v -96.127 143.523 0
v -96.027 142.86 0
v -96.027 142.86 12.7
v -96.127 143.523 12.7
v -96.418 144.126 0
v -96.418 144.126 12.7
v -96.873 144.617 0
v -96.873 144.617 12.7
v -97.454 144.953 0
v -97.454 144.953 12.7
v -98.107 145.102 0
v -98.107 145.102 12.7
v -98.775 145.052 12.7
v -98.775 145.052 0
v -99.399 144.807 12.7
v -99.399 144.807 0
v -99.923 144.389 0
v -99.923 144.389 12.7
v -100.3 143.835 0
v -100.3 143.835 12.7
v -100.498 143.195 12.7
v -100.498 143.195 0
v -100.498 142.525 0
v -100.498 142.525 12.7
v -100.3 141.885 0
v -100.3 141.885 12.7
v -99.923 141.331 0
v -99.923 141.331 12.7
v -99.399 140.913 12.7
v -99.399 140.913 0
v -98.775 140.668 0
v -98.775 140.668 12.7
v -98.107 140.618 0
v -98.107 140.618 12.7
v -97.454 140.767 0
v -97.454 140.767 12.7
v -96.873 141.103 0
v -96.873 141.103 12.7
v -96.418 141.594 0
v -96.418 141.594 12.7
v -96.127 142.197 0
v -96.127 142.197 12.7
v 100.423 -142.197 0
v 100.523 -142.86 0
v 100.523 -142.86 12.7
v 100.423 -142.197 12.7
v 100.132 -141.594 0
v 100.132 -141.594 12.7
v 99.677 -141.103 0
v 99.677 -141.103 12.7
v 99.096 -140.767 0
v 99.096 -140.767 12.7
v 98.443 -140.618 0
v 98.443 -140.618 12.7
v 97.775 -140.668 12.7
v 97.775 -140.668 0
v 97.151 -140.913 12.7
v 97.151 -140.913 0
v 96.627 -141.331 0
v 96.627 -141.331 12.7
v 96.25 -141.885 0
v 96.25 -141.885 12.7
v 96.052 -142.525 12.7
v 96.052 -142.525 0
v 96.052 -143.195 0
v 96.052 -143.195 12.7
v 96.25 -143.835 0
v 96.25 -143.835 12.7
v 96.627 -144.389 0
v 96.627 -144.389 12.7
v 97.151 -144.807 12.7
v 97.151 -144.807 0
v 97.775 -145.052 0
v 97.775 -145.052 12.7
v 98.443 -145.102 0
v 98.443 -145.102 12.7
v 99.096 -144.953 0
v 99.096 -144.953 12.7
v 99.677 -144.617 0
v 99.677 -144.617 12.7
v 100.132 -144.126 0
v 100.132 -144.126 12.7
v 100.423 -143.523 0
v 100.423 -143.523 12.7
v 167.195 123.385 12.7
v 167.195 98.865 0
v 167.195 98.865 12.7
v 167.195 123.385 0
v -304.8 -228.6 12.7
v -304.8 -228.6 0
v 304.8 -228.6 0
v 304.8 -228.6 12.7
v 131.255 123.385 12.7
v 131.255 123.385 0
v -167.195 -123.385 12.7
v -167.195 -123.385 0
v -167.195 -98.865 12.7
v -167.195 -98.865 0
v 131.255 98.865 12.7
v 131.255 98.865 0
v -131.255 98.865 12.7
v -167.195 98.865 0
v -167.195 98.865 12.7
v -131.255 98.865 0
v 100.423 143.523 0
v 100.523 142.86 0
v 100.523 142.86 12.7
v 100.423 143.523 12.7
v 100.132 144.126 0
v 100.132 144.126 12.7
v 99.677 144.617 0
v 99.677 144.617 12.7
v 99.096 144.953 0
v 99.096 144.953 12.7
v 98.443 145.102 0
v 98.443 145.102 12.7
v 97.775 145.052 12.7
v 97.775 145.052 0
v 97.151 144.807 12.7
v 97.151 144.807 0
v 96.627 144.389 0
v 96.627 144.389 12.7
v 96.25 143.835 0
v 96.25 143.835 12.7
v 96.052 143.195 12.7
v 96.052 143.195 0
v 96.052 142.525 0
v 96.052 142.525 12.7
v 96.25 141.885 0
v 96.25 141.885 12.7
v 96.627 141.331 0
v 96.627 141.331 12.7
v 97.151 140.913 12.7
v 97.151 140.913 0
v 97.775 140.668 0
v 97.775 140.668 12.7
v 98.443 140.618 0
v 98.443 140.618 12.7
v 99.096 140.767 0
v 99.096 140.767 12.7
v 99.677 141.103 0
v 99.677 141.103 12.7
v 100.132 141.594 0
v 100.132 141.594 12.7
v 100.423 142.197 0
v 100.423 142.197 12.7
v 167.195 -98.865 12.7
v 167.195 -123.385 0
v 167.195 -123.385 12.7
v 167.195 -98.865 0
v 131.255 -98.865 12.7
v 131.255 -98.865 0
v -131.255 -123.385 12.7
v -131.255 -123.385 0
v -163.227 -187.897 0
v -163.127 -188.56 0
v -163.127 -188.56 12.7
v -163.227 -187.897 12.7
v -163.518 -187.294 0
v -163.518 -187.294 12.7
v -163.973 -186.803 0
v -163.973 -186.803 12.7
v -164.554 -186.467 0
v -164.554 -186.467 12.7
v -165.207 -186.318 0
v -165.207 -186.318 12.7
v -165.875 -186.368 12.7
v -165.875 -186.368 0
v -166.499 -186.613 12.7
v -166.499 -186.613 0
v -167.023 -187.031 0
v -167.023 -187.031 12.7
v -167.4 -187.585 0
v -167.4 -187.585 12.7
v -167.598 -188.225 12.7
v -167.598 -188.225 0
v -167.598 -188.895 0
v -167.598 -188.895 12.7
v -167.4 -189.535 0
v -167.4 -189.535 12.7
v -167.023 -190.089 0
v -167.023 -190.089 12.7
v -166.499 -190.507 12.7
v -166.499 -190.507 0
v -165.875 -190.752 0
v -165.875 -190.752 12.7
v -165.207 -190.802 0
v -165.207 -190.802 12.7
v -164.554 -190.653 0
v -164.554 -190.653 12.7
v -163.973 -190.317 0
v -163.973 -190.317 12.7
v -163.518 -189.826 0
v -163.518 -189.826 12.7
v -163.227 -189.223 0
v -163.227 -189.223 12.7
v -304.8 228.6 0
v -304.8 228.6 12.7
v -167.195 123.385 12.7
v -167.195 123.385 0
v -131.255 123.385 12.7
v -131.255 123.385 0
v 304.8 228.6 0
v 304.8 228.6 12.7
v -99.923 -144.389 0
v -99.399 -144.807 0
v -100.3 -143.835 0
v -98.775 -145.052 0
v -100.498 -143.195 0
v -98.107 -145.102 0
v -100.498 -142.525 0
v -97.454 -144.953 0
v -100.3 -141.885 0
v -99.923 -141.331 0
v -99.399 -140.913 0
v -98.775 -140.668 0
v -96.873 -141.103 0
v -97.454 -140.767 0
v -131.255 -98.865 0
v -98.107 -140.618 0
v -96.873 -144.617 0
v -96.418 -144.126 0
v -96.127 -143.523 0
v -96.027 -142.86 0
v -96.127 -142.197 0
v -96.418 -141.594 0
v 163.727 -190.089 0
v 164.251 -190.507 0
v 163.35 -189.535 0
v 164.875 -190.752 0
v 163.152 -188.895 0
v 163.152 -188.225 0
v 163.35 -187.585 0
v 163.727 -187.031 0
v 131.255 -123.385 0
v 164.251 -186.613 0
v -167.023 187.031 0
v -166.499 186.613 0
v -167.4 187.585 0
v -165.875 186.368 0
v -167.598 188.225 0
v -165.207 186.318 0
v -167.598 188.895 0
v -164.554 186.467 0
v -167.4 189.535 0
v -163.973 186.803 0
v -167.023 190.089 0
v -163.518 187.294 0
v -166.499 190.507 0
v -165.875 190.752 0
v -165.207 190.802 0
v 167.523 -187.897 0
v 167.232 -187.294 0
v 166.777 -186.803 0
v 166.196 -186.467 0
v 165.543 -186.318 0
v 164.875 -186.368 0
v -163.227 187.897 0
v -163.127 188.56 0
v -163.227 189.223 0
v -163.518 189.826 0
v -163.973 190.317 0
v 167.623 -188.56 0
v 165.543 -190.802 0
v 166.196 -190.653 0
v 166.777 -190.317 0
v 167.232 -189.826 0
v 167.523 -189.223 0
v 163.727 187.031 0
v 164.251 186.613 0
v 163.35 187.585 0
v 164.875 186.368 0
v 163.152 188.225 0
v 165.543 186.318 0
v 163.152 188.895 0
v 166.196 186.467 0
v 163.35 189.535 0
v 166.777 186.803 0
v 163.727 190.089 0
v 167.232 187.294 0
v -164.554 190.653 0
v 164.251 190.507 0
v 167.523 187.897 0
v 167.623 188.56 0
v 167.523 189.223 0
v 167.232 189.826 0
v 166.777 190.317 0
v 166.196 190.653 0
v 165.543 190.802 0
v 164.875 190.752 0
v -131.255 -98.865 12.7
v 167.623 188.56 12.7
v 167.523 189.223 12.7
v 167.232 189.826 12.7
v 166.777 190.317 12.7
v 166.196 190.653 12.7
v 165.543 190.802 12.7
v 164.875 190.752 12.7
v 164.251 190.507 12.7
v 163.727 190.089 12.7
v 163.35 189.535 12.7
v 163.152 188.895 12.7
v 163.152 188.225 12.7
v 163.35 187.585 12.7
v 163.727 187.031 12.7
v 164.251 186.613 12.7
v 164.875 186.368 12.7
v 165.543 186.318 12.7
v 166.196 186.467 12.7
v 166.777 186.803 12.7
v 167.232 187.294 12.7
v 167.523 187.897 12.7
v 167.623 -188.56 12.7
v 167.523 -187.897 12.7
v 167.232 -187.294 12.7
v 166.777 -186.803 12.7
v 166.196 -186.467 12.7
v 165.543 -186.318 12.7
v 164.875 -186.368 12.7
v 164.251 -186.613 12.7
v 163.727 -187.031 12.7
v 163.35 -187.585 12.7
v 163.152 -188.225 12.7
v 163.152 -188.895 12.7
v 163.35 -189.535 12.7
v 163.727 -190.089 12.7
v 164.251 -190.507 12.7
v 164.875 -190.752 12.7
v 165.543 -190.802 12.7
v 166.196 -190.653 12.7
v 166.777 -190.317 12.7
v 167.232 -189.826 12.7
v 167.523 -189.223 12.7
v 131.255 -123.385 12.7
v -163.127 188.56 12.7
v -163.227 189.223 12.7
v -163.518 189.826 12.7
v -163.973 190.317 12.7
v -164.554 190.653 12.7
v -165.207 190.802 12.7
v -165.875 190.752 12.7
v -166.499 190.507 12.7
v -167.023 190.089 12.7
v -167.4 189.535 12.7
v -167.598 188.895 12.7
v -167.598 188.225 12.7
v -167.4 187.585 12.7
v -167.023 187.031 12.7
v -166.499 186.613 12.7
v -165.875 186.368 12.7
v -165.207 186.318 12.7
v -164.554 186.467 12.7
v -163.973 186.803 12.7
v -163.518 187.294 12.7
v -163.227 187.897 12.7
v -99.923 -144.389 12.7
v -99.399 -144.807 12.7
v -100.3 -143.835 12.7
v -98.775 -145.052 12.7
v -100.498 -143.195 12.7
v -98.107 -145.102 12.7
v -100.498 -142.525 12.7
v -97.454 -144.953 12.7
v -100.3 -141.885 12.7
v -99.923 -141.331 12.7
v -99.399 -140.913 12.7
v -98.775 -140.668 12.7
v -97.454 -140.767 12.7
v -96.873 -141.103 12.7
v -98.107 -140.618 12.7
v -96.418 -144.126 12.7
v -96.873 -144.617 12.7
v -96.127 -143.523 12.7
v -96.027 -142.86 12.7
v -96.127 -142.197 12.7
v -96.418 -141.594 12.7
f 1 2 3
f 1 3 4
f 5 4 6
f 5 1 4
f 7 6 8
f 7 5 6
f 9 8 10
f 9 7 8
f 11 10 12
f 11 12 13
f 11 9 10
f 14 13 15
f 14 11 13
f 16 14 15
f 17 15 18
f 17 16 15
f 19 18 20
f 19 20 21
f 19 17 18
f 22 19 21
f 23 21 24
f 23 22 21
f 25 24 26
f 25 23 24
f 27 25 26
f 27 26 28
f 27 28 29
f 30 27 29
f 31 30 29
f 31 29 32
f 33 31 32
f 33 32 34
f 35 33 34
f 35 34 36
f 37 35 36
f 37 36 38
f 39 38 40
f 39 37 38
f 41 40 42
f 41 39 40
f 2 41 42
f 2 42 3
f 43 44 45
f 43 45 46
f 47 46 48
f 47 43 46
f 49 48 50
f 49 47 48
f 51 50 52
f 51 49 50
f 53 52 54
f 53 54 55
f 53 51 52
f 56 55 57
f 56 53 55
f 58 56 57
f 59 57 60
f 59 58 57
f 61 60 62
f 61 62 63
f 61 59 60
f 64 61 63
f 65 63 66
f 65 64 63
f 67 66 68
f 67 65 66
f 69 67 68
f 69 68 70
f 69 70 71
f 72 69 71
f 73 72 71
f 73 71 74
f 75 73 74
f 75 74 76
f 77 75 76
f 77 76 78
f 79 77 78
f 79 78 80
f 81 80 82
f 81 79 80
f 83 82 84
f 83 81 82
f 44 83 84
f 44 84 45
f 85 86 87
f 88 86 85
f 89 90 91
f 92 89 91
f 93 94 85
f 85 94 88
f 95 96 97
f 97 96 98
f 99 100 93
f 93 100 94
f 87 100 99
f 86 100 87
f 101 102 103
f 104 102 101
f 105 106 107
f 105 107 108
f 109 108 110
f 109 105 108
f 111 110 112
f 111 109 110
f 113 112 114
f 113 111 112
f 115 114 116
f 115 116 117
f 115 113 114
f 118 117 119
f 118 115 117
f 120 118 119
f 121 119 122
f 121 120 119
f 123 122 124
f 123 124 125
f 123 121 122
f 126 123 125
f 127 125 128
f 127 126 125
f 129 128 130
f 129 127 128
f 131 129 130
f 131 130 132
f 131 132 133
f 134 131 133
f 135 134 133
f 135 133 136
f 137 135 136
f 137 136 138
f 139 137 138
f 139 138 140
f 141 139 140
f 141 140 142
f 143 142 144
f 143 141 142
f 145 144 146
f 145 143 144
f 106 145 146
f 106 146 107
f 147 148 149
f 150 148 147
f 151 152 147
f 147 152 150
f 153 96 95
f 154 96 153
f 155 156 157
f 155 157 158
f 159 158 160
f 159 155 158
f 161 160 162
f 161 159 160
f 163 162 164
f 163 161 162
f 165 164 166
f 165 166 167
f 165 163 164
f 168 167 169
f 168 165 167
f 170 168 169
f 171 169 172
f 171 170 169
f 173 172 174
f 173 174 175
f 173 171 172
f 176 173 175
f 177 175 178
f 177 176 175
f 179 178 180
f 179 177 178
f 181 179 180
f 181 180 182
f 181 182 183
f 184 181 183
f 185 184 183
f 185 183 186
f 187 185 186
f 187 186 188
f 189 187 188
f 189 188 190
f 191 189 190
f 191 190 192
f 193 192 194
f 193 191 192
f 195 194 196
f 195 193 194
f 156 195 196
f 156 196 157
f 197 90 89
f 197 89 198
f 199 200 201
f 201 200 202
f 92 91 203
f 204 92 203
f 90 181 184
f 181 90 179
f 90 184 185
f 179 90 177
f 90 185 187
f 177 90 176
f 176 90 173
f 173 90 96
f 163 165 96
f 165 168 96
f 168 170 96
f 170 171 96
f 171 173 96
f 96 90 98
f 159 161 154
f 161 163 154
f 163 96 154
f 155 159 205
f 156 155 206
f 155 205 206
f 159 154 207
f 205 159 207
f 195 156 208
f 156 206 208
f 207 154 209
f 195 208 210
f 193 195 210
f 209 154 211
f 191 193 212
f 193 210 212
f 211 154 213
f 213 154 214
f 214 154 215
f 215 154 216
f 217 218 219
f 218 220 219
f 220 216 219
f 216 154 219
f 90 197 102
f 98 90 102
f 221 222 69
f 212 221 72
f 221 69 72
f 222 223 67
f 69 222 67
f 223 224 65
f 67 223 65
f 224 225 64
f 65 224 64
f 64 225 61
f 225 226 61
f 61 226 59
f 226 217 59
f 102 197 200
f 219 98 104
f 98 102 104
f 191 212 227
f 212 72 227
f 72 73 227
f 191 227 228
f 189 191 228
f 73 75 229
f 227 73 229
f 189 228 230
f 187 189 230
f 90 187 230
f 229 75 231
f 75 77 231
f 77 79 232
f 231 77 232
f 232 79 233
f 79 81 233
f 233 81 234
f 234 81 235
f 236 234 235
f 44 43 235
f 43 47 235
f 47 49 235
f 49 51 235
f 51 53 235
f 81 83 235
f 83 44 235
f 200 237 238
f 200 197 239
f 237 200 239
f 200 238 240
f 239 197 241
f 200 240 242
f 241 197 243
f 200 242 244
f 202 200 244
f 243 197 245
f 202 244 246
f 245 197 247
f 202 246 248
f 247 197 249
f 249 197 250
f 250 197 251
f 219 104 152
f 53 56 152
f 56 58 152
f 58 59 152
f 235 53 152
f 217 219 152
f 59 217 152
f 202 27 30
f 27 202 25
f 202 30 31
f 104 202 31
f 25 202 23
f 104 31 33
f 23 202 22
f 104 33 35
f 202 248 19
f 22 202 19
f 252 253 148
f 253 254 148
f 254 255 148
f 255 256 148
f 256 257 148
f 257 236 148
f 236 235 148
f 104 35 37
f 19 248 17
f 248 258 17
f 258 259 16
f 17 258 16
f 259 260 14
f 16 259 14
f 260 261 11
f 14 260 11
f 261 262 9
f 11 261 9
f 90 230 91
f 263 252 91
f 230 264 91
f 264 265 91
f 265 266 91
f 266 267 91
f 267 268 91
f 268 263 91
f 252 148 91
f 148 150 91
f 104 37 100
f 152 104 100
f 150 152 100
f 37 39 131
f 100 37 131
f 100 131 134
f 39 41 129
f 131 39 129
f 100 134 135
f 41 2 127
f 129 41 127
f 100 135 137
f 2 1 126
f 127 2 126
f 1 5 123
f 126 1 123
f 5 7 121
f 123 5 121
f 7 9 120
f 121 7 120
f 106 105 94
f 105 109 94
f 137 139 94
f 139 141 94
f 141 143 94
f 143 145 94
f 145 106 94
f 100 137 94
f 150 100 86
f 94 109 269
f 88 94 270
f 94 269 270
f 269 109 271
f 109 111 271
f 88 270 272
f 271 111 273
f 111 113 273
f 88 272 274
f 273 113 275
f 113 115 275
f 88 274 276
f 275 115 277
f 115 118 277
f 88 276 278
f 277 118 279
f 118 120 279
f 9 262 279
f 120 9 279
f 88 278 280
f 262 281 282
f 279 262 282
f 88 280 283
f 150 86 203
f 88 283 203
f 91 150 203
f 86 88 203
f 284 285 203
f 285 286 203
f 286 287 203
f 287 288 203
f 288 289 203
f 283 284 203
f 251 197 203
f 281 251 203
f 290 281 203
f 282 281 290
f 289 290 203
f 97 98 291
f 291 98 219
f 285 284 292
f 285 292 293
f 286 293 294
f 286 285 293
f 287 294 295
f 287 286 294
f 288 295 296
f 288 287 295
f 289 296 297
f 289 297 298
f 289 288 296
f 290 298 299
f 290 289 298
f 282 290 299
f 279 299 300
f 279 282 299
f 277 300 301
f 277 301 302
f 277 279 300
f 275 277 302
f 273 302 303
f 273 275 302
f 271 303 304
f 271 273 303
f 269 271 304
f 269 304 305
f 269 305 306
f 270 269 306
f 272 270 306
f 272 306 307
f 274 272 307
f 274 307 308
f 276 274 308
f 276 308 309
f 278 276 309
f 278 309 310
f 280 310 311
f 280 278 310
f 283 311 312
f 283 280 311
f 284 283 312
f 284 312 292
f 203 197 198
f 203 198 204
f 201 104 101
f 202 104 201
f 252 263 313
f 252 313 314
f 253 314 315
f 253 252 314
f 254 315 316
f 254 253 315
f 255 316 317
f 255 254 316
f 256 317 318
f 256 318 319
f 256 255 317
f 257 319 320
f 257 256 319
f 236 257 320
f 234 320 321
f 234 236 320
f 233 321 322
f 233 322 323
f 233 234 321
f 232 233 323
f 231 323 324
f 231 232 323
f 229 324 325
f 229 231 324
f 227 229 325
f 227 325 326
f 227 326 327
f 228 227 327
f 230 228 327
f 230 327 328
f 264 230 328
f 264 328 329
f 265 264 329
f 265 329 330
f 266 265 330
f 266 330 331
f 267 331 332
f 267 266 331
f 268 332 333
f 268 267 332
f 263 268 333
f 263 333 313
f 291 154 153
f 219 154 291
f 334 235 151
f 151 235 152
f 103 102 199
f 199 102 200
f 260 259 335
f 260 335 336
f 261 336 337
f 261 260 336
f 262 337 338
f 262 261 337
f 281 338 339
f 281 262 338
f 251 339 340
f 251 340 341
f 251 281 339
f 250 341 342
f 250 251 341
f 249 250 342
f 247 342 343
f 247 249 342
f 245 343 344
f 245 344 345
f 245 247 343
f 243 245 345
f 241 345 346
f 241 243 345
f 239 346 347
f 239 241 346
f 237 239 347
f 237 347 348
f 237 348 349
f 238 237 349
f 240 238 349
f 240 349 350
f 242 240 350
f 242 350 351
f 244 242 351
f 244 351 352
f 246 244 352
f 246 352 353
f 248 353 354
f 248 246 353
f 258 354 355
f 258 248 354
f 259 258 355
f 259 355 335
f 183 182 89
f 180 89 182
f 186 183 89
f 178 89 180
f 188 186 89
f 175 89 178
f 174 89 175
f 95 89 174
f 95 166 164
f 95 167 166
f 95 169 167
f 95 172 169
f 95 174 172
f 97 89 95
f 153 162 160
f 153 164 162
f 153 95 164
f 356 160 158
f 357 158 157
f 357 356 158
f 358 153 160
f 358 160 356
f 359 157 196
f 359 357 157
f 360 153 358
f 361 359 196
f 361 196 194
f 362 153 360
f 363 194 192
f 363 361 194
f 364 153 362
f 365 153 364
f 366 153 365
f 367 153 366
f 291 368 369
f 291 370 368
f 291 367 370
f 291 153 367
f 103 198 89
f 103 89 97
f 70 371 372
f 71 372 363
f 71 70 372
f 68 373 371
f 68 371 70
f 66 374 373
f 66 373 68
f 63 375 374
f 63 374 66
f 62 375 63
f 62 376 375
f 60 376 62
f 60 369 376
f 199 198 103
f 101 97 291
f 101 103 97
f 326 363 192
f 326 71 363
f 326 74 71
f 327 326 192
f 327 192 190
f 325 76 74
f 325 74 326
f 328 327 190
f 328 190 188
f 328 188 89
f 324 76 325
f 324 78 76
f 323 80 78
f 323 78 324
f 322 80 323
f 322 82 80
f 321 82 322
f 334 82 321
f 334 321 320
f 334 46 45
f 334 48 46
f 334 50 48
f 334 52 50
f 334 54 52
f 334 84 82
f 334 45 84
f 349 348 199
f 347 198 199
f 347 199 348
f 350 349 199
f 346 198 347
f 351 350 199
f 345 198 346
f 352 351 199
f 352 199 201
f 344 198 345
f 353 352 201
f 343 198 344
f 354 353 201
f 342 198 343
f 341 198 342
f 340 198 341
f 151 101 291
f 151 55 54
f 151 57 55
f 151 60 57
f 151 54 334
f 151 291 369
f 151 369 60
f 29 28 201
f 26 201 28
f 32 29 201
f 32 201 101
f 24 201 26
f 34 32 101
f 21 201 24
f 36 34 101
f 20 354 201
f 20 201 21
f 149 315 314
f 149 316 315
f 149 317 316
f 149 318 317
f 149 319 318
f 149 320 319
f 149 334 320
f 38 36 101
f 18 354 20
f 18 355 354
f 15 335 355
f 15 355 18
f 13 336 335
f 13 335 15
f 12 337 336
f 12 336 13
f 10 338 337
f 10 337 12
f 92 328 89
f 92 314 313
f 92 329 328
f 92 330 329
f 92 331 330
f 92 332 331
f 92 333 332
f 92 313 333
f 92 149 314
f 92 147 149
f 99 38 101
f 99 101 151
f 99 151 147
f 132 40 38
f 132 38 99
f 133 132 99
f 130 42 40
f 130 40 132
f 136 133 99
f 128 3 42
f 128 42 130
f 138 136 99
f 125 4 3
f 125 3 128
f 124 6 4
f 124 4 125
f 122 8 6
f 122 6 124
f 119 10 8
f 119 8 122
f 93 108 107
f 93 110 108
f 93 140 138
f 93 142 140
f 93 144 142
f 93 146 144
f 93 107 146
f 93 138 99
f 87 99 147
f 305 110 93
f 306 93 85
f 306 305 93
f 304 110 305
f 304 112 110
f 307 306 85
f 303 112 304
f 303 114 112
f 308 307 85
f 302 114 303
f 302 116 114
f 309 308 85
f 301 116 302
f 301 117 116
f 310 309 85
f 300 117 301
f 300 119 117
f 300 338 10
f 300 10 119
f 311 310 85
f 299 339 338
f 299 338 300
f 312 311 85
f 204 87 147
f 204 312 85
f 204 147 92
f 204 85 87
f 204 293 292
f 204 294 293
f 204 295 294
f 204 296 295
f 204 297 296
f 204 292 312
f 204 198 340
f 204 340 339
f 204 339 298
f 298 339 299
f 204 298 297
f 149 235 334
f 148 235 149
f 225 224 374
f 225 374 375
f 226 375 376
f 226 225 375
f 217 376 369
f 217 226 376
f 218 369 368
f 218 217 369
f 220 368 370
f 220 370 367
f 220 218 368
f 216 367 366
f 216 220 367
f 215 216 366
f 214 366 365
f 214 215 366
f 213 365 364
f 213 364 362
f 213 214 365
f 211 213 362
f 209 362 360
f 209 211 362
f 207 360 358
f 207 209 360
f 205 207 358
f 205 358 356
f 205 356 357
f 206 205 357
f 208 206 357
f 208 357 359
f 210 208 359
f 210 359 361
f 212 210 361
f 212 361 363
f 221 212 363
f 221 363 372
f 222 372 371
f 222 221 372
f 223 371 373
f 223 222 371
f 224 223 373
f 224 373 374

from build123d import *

# Parameters (mm, degrees)
F0_W     = 609.6
F0_H     = 457.2
F0_R     = 2.2479
F0_W_2   = 35.94001
F0_H_2   = 24.519992
F1_DEPTH = 12.7


with BuildPart() as f1:
    # F0 (on Top) → F1 (new body)
    with BuildSketch(Plane.XY):
        Rectangle(F0_W, F0_H)
        with Locations((-165.375006, -188.559999)):
            Circle(F0_R, mode=Mode.SUBTRACT)
        with Locations((-98.274988, -142.859989)):
            Circle(F0_R, mode=Mode.SUBTRACT)
        with Locations((-149.225, -111.125)):
            Rectangle(F0_W_2, F0_H_2, mode=Mode.SUBTRACT)
        with Locations((98.274988, -142.859989)):
            Circle(F0_R, mode=Mode.SUBTRACT)
        with Locations((165.375006, -188.559999)):
            Circle(F0_R, mode=Mode.SUBTRACT)
        with Locations((149.225, -111.125)):
            Rectangle(F0_W_2, F0_H_2, mode=Mode.SUBTRACT)
        with Locations((-149.225, 111.125)):
            Rectangle(F0_W_2, F0_H_2, mode=Mode.SUBTRACT)
        with Locations((-165.375006, 188.559999)):
            Circle(F0_R, mode=Mode.SUBTRACT)
        with Locations((-98.274988, 142.859989)):
            Circle(F0_R, mode=Mode.SUBTRACT)
        with Locations((149.225, 111.125)):
            Rectangle(F0_W_2, F0_H_2, mode=Mode.SUBTRACT)
        with Locations((98.274988, 142.859989)):
            Circle(F0_R, mode=Mode.SUBTRACT)
        with Locations((165.375006, 188.559999)):
            Circle(F0_R, mode=Mode.SUBTRACT)
    extrude(amount=F1_DEPTH)


solid = f1.part
